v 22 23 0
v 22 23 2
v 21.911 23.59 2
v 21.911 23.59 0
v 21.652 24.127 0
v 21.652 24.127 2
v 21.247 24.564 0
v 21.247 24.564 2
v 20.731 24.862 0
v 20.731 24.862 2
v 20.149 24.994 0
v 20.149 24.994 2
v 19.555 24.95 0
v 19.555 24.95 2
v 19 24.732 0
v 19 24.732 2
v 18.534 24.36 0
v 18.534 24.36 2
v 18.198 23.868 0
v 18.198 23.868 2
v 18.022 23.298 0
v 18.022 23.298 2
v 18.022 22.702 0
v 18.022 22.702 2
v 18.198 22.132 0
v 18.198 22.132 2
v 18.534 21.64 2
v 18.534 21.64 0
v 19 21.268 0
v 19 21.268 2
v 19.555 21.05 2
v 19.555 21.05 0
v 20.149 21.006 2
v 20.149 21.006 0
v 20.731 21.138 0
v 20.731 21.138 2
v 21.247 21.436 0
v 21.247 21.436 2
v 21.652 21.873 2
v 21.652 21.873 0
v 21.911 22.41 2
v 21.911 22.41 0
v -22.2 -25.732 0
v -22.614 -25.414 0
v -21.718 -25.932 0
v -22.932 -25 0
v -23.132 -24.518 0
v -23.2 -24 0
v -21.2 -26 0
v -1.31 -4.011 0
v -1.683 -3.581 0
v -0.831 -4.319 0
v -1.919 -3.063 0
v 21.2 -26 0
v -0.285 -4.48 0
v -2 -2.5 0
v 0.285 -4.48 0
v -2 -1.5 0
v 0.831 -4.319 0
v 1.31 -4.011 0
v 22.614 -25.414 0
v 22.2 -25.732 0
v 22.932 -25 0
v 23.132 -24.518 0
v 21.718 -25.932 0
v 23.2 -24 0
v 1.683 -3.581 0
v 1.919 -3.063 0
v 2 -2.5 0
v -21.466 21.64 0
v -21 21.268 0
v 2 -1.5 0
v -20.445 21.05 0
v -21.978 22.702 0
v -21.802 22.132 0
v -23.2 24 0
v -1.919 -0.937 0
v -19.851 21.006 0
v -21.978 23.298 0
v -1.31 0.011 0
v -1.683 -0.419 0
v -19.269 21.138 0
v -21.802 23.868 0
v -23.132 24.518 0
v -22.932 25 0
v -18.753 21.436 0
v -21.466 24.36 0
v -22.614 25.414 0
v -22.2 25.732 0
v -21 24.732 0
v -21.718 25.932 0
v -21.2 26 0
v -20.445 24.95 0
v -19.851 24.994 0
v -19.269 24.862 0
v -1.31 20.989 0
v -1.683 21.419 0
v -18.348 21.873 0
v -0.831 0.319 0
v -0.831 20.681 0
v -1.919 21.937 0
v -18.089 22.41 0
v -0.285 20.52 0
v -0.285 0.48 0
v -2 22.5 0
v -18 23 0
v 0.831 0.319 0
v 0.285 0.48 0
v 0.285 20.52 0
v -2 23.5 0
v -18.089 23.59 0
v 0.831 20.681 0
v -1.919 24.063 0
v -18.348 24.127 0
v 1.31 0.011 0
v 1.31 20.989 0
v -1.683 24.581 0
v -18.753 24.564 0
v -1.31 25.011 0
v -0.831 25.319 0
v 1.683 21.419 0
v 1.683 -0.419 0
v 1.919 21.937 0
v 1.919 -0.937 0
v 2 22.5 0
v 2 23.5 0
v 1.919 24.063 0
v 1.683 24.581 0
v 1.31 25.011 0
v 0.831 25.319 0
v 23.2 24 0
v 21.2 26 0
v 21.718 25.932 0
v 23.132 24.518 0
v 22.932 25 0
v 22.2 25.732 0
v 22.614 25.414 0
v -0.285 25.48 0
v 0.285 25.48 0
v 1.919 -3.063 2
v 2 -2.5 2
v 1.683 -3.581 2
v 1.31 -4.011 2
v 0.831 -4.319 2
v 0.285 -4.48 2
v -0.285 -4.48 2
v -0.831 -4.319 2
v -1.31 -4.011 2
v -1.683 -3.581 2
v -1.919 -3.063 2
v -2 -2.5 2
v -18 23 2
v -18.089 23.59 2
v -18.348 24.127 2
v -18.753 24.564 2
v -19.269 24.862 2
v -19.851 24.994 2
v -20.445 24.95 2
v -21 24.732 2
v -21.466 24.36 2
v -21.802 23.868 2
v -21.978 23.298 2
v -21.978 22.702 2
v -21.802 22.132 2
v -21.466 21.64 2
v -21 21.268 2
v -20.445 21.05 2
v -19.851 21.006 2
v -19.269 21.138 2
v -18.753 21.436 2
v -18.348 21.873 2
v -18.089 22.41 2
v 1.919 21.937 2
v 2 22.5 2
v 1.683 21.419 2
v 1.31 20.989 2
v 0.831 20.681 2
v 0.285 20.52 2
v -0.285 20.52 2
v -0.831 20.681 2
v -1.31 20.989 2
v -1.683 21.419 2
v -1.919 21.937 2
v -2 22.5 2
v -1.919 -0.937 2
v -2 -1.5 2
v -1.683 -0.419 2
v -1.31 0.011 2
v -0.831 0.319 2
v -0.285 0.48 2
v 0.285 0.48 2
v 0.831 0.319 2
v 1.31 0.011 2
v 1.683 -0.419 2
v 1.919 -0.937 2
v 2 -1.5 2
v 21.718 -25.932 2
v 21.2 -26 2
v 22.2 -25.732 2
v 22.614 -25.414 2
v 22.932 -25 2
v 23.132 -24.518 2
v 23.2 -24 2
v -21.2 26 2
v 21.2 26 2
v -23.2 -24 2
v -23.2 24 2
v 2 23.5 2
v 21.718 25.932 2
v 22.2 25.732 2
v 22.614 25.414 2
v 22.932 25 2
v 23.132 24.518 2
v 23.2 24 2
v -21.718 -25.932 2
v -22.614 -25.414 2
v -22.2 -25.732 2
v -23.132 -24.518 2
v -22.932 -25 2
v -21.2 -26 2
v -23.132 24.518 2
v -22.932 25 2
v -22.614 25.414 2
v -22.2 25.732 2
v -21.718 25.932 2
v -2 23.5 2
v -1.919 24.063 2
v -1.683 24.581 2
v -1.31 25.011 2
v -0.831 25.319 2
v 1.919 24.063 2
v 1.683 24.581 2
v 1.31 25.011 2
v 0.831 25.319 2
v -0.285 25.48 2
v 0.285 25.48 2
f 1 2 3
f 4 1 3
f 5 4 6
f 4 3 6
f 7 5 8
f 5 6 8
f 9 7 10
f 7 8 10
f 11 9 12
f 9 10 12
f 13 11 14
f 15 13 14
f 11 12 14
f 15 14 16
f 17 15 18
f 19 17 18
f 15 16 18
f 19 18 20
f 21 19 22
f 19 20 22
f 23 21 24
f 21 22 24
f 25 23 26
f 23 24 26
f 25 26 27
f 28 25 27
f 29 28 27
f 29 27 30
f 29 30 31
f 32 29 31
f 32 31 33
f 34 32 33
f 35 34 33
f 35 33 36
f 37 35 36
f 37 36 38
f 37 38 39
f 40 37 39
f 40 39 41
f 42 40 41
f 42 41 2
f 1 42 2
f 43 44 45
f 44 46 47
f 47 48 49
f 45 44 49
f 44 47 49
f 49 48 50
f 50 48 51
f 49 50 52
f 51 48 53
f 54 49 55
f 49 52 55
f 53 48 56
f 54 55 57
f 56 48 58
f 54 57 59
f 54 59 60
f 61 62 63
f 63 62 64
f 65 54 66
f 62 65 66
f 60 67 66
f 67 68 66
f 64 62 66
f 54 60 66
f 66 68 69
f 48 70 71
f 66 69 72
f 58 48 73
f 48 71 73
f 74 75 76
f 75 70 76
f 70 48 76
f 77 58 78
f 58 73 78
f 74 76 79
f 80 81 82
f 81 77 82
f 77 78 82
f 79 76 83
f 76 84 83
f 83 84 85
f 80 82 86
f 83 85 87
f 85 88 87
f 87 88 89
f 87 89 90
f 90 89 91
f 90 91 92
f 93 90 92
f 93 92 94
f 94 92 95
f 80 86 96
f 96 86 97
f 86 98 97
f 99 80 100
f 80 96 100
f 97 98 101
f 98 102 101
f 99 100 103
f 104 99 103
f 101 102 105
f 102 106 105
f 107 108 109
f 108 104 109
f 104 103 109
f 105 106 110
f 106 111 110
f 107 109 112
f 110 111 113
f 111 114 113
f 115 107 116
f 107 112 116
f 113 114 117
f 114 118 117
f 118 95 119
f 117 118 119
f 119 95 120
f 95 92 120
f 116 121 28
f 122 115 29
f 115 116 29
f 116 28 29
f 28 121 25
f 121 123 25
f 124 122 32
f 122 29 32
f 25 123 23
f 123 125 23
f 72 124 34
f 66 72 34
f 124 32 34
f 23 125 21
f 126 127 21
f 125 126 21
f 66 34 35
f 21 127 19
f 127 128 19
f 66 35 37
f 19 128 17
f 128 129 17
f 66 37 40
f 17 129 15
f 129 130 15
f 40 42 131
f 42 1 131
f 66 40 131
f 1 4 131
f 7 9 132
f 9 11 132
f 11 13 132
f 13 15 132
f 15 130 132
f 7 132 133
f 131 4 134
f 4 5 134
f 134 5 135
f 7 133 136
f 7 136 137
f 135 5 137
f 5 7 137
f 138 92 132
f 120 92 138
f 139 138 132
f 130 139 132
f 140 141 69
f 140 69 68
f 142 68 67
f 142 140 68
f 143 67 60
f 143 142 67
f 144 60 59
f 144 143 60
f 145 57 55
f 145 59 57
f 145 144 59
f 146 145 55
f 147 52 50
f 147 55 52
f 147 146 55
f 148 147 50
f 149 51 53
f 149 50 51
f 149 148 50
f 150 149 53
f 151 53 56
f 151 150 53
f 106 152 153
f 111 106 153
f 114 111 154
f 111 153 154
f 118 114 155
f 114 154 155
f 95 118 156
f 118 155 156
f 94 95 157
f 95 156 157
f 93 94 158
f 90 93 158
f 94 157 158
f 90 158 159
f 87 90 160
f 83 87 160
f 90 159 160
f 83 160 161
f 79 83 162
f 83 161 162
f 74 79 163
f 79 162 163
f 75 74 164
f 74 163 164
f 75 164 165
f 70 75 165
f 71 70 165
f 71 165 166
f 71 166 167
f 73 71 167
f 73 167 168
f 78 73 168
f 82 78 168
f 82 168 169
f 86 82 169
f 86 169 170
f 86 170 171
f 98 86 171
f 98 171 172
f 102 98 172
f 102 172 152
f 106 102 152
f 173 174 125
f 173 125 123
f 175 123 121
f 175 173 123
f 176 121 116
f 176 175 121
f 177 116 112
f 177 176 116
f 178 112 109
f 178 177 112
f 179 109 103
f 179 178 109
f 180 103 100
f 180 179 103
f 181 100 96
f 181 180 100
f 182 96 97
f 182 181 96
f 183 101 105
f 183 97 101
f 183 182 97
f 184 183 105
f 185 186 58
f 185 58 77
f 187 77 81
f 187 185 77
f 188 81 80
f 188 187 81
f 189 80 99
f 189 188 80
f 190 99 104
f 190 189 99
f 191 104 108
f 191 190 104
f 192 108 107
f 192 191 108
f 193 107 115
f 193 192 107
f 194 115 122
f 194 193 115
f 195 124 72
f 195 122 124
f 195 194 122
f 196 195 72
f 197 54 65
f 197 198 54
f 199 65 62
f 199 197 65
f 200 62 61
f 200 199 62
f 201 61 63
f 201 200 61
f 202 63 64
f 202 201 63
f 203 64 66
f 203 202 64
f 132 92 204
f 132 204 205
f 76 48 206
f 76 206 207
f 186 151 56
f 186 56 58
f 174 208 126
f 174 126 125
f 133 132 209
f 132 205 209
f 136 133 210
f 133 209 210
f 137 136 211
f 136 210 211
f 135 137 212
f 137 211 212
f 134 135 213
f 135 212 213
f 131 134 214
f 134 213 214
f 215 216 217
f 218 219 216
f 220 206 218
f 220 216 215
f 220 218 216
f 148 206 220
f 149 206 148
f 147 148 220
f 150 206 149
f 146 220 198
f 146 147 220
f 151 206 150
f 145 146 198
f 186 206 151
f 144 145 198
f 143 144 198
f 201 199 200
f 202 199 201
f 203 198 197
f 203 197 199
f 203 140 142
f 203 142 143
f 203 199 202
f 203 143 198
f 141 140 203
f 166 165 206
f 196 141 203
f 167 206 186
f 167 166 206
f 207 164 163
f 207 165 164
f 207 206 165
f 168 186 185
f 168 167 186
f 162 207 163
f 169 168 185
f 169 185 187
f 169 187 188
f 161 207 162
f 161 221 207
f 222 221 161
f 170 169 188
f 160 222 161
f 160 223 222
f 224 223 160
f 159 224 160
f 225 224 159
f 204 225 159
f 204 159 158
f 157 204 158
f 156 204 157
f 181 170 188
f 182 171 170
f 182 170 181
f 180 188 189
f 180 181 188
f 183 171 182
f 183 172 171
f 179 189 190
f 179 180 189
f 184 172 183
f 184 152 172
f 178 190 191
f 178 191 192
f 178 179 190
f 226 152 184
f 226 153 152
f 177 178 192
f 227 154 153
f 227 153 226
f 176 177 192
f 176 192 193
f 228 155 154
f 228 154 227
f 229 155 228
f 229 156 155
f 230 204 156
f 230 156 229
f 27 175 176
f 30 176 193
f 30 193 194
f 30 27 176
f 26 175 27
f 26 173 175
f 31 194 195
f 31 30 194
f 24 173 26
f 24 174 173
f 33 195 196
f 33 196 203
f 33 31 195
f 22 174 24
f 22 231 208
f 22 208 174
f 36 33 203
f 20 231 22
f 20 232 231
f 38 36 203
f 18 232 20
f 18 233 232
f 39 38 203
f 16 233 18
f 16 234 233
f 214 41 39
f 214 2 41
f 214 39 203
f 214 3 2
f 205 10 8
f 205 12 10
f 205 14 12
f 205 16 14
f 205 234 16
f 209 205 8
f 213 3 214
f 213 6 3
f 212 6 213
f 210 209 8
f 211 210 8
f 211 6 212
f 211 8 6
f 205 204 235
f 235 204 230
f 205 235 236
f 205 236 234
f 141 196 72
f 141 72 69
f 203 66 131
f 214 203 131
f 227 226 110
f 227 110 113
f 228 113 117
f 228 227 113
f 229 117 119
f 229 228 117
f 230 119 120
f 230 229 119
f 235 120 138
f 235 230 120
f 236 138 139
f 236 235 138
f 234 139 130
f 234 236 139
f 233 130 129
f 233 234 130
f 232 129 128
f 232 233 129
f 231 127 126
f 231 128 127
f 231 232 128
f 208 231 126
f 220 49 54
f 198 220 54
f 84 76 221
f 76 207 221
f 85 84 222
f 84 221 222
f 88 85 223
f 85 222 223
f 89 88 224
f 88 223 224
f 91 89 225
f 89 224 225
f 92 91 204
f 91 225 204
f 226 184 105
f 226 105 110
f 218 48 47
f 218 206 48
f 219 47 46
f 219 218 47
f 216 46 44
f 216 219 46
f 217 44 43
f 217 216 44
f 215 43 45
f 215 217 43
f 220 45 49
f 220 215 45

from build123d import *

# Parameters (mm, degrees)
ESQUISSE1_W             = 46.4
ESQUISSE1_H             = 52
EXTRUSION1_DEPTH        = 2
ESQUISSE2_R             = 2
ENL_V_MAT_EXTRU_1_DEPTH = 3
ENL_V_MAT_EXTRU_2_DEPTH = 3
CONG_1_R                = 2


with BuildPart() as part:
    # Esquisse1 → Extrusion1 (new body)
    with BuildSketch(Plane.XY):
        Rectangle(ESQUISSE1_W, ESQUISSE1_H)
    extrude(amount=EXTRUSION1_DEPTH)

    # Esquisse2 → Enlèv. mat.-Extru.1 (cut, through all)
    with BuildSketch(Plane.XY.offset(2)):
        with Locations((-20, 23)):
            Circle(ESQUISSE2_R)
        with Locations((20, 23)):
            Circle(ESQUISSE2_R)
    extrude(amount=-ENL_V_MAT_EXTRU_1_DEPTH, mode=Mode.SUBTRACT)

    # Esquisse3 → Enlèv. mat.-Extru.2 (cut, through all)
    with BuildSketch(Plane.XY.offset(2)):
        with BuildLine():
            Line((2, 23.5), (2, 22.5))
            ThreePointArc((2, 22.5), (0, 20.5), (-2, 22.5))
            Line((-2, 22.5), (-2, 23.5))
            ThreePointArc((-2, 23.5), (0, 25.5), (2, 23.5))
        make_face()
        with BuildLine():
            Line((2, -1.5), (2, -2.5))
            ThreePointArc((2, -2.5), (0, -4.5), (-2, -2.5))
            Line((-2, -2.5), (-2, -1.5))
            ThreePointArc((-2, -1.5), (0, 0.5), (2, -1.5))
        make_face()
    extrude(amount=-ENL_V_MAT_EXTRU_2_DEPTH, mode=Mode.SUBTRACT)

    # Congé1
    cong_1_edges = [part.edges().sort_by_distance(p)[0] for p in [
        (-23.2, 26, 1),
        (23.2, 26, 1),
        (23.2, -26, 1),
        (-23.2, -26, 1),
    ]]
    fillet(cong_1_edges, radius=CONG_1_R)


solid = part.part
